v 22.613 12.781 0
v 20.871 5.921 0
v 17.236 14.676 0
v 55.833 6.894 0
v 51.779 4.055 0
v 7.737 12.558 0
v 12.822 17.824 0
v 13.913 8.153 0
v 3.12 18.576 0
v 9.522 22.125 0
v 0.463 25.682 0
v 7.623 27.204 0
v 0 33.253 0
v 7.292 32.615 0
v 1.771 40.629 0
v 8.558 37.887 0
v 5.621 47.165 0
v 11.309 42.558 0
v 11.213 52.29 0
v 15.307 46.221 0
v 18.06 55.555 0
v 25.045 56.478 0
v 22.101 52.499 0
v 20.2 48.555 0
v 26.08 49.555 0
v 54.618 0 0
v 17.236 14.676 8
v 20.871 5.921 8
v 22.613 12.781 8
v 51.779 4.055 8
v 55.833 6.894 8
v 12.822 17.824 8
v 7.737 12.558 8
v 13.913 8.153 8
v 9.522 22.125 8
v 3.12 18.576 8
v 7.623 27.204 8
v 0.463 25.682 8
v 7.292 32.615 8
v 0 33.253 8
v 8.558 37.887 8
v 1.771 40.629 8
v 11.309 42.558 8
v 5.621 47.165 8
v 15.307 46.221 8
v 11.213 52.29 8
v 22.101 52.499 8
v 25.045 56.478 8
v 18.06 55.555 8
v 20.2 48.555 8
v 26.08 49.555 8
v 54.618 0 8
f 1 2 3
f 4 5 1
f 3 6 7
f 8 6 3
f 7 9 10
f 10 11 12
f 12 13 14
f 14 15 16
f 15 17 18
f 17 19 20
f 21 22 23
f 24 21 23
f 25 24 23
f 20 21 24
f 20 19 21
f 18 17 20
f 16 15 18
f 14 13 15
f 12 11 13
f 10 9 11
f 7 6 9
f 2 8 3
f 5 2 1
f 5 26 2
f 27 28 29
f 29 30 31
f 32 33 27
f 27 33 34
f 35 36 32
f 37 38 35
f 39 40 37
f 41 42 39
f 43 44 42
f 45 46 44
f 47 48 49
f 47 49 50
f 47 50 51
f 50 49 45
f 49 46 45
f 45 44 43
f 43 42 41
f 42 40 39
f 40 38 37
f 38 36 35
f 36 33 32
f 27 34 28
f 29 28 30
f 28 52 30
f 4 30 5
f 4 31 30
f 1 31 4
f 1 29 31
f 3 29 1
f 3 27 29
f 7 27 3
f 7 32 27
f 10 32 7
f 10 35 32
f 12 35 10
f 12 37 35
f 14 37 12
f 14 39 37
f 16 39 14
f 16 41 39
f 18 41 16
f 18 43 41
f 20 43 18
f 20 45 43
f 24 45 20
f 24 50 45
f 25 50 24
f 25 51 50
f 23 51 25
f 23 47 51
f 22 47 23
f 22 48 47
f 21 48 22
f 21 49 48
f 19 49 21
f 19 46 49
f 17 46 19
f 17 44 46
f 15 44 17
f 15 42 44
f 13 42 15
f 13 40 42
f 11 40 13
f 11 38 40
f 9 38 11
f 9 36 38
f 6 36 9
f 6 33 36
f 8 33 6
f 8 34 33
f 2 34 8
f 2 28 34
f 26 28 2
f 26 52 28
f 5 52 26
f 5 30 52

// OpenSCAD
$fn = 32;

// ----------------------------------------------------------------------
// Hook plate: curl radius 22 mm over 170 degrees, 7 mm thick band
// ----------------------------------------------------------------------

// --- parameters (mm) ---
profile_height = 8;       // extrusion height
profile_points = 26;      // points of the closed outline

profile = [[22.101, 52.499], [25.045, 56.478], [18.06, 55.555], [11.213, 52.29], [5.621, 47.165], [1.771, 40.629], [0, 33.253], [0.463, 25.682], [3.12, 18.576], [7.737, 12.558], [13.913, 8.153], [20.871, 5.921], [54.618, 0], [51.779, 4.055], [55.833, 6.894], [22.613, 12.781], [17.236, 14.676], [12.822, 17.824], [9.522, 22.125], [7.623, 27.204], [7.292, 32.615], [8.558, 37.887], [11.309, 42.558], [15.307, 46.221], [20.2, 48.555], [26.08, 49.555]];  // single closed polygon, 26 points, counter clockwise

// --- the one profile operation ---
linear_extrude(height = profile_height) polygon(points = profile);
